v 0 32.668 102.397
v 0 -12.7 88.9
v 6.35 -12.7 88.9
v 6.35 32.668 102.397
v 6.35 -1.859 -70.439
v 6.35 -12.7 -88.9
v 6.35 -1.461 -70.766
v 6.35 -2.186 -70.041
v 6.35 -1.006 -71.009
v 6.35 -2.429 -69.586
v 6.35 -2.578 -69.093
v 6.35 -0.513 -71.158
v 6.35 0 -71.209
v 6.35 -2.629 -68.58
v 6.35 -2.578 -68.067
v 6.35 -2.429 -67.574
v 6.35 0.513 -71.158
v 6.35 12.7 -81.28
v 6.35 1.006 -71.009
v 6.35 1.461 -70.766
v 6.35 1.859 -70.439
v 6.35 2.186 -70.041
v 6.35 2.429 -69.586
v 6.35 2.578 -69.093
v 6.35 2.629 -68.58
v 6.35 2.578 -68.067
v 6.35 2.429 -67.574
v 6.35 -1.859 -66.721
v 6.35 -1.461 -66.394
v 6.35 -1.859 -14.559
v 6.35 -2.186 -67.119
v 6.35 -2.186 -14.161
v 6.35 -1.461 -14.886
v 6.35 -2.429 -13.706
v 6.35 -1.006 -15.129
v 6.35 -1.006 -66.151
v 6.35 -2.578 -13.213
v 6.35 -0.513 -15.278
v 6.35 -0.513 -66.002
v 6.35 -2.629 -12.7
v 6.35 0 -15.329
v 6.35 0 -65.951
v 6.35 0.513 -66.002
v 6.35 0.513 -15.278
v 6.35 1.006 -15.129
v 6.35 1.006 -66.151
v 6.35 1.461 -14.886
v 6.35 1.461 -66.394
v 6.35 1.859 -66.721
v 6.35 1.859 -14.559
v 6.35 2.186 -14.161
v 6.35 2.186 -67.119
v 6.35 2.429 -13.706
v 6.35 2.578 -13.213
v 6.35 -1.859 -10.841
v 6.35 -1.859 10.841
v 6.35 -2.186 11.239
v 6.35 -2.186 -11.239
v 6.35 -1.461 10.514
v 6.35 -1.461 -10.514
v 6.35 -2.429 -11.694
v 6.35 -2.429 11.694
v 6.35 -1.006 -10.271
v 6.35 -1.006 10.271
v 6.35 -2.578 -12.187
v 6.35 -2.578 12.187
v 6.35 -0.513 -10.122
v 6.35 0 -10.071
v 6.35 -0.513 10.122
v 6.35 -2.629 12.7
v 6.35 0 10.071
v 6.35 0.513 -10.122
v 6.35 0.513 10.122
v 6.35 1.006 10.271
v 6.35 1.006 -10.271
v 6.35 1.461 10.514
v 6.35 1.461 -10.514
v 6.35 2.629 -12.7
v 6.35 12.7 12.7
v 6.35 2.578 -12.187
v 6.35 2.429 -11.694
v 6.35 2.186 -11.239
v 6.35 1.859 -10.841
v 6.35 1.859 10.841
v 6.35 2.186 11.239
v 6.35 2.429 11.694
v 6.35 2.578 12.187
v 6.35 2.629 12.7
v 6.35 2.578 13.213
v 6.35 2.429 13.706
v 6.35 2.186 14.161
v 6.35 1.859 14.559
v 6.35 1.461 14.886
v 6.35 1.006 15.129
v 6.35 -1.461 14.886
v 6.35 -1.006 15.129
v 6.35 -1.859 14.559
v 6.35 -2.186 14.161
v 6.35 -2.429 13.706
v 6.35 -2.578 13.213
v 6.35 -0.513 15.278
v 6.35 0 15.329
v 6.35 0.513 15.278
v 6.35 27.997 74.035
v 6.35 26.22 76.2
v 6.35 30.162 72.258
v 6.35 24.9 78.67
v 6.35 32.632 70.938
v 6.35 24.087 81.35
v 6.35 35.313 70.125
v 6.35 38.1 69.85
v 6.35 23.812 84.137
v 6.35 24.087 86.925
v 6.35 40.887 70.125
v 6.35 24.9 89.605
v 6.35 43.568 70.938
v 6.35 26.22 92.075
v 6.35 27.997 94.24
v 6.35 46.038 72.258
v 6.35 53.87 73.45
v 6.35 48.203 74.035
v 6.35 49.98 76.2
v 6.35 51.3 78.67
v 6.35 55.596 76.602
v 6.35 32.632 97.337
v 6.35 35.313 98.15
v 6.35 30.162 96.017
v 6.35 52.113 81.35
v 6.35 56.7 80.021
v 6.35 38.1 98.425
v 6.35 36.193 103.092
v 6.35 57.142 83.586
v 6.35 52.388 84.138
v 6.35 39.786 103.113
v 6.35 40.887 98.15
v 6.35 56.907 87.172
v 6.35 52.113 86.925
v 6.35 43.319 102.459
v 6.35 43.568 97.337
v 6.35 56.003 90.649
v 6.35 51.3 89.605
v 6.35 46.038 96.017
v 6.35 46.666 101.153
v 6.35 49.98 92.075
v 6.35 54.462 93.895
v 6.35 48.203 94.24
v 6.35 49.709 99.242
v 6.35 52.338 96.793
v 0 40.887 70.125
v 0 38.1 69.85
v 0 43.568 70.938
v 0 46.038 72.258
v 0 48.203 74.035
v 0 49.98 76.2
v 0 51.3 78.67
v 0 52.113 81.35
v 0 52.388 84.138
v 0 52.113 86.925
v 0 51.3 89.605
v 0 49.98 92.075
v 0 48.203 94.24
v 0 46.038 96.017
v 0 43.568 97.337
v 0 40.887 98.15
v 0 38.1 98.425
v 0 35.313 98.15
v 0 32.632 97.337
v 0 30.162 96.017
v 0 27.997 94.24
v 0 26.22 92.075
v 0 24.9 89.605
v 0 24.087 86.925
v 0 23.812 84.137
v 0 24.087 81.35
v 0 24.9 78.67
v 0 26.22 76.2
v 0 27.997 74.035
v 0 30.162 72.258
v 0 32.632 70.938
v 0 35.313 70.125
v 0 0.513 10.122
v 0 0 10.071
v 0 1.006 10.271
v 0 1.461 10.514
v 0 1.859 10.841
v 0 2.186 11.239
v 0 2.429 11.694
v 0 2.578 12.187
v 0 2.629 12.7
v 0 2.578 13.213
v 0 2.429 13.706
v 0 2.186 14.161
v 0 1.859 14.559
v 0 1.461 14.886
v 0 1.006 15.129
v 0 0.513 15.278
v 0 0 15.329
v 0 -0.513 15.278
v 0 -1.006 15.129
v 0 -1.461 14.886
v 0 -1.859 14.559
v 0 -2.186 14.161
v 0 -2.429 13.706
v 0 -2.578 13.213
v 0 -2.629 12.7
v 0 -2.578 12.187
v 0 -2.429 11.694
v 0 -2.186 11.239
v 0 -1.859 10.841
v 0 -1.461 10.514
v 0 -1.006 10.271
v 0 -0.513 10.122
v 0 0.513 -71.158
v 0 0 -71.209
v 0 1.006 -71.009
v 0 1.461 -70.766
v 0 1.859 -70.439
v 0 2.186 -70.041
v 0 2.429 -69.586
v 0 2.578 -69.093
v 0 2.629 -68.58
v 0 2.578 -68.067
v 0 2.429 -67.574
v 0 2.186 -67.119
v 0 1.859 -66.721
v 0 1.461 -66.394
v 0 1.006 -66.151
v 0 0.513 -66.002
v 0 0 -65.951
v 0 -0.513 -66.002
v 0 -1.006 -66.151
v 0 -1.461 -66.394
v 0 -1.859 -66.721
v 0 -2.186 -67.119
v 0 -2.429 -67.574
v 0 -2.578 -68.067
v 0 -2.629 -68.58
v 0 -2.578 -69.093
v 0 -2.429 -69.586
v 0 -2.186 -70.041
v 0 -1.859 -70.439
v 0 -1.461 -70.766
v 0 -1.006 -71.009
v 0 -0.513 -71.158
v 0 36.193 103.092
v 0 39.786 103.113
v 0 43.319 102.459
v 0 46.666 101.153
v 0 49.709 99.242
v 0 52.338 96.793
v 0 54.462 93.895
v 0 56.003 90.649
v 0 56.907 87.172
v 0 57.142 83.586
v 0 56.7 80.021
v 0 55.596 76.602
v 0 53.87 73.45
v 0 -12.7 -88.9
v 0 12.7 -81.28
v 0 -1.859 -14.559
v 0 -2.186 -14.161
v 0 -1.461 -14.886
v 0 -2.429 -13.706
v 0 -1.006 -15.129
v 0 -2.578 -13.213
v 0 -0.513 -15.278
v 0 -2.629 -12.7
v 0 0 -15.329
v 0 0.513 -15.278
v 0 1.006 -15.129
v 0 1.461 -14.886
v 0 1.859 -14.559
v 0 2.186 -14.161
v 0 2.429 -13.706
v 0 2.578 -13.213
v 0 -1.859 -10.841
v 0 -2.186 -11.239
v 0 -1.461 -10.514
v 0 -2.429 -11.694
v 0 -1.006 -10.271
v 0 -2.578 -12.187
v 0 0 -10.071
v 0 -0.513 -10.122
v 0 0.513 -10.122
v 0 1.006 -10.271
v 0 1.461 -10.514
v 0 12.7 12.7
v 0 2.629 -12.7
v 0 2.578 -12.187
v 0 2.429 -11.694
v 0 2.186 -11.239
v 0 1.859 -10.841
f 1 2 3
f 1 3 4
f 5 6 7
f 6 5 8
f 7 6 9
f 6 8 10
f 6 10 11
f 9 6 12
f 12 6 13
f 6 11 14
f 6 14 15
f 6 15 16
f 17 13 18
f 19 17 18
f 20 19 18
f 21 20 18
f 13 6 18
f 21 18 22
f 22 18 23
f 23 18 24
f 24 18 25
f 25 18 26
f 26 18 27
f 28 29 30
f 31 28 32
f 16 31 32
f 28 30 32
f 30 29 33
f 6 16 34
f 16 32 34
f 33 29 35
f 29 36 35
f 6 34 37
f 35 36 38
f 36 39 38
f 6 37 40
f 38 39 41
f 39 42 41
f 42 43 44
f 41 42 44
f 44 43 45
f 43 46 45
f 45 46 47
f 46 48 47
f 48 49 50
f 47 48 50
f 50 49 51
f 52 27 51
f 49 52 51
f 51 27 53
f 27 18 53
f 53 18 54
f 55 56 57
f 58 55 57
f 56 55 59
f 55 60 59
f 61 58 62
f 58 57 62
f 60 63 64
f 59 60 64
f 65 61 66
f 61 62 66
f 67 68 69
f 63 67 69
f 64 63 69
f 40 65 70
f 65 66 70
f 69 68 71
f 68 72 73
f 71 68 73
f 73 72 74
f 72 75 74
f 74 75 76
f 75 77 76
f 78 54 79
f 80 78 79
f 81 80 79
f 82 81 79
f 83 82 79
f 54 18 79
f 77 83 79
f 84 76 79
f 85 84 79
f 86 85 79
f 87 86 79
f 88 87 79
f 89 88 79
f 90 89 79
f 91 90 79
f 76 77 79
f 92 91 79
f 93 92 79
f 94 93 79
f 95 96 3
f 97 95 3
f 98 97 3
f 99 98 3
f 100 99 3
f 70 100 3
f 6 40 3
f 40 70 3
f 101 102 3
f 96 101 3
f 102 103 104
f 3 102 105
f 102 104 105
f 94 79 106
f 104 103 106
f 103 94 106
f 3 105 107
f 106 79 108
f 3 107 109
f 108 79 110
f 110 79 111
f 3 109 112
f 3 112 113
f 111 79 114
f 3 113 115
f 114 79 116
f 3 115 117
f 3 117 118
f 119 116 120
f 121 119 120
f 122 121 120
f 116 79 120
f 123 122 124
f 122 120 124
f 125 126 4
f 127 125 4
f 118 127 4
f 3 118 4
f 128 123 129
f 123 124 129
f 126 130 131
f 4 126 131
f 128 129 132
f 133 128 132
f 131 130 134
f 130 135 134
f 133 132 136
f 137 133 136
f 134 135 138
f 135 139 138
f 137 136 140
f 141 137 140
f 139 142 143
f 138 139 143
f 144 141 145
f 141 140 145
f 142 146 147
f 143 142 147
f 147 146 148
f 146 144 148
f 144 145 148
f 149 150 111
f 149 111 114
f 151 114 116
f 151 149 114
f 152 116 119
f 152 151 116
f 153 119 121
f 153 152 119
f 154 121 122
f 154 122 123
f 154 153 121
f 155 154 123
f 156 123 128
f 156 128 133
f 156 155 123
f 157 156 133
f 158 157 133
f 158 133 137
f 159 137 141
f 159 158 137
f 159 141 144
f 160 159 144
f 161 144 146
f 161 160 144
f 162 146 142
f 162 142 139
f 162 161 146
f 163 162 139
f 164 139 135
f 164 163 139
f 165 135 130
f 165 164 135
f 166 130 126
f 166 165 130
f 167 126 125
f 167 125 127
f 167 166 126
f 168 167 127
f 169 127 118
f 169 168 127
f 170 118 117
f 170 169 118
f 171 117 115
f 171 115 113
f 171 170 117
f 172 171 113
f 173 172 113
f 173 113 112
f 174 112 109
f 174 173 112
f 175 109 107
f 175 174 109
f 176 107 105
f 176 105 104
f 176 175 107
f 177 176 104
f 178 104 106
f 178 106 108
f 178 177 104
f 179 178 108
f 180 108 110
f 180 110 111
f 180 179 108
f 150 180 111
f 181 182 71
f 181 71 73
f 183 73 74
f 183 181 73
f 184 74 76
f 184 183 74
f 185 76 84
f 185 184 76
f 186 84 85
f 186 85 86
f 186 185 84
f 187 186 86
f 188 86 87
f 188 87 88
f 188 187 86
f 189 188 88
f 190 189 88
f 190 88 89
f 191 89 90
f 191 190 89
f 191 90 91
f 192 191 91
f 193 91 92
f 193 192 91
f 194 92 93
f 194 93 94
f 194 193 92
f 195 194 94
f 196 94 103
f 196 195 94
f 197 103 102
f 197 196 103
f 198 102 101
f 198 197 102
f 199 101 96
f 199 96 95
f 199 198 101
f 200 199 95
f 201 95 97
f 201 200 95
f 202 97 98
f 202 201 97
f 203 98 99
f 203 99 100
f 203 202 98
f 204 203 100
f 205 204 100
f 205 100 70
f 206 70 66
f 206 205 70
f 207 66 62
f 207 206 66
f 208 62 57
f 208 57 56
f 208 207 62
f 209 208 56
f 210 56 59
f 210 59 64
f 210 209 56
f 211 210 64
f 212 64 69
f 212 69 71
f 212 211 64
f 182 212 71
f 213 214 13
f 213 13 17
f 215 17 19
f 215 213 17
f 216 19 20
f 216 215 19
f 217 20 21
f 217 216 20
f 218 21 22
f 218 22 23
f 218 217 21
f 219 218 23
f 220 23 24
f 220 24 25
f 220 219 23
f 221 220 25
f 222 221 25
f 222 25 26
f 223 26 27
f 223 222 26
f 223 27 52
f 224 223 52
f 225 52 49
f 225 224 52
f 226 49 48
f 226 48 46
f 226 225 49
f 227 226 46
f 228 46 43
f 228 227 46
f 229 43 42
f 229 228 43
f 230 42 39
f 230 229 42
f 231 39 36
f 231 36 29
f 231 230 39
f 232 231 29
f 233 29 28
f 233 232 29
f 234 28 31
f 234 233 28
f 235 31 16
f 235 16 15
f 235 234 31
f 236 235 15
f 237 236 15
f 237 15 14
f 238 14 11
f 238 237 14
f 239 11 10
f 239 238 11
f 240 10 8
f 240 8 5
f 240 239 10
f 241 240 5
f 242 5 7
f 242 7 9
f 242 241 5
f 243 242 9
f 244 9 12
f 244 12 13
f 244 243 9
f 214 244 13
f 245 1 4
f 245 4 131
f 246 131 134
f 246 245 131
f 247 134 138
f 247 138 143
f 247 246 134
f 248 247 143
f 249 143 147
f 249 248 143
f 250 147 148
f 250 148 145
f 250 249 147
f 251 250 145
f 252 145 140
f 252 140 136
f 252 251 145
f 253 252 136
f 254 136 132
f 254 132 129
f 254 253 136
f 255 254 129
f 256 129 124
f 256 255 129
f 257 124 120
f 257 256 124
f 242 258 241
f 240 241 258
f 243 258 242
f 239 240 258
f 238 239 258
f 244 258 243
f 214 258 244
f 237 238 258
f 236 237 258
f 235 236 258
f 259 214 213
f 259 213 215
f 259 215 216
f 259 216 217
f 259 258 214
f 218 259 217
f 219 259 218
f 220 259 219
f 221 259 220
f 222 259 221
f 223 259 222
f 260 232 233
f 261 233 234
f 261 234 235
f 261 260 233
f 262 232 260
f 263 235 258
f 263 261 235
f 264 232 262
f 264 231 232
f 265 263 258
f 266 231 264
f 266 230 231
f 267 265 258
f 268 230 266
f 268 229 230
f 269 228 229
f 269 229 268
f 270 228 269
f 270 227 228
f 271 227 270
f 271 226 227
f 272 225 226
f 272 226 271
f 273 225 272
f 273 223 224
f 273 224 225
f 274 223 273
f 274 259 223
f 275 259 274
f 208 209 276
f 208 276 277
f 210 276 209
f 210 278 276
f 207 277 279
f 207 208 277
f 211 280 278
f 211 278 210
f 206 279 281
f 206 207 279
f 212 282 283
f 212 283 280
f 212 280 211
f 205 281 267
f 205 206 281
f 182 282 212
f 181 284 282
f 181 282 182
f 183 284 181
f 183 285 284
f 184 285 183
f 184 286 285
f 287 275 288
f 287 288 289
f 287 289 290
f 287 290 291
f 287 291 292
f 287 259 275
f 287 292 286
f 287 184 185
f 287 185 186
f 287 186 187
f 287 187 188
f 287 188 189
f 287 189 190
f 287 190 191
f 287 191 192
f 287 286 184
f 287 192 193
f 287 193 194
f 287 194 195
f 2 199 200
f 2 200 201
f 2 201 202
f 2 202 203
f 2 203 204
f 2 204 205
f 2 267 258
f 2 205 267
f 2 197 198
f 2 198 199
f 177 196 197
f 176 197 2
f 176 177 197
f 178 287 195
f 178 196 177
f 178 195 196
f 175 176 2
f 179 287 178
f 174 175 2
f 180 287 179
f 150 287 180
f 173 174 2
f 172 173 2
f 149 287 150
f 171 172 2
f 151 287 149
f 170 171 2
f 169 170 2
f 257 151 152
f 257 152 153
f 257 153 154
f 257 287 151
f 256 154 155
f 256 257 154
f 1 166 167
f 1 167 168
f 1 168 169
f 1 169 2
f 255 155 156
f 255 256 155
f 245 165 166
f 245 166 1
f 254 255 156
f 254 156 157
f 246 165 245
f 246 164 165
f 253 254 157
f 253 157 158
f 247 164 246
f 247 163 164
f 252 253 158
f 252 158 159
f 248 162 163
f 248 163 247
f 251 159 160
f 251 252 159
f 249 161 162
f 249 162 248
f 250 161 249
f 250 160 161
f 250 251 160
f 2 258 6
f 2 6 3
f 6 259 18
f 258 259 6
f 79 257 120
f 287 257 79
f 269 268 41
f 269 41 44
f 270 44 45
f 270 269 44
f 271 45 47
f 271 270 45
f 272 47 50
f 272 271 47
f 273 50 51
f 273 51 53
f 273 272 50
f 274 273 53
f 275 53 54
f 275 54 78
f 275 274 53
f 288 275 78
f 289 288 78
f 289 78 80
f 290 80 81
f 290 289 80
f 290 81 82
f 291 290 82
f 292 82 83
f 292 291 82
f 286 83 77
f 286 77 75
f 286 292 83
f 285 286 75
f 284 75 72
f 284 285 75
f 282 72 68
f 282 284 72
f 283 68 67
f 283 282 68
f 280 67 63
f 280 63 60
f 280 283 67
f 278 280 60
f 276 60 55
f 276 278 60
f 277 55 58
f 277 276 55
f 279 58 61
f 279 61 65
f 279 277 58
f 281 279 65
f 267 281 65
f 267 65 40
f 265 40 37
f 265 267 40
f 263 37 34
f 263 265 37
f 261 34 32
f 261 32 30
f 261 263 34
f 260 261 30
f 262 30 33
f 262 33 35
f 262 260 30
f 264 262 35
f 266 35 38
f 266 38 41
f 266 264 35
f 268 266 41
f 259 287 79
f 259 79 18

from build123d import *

# Parameters (mm, degrees)
SKETCH1_R           = 14.2875
SKETCH1_R_2         = 2.6289
BOSS_EXTRUDE1_DEPTH = 6.35


with BuildPart() as part:
    # Sketch1 → Boss-Extrude1 (new body)
    with BuildSketch(Plane(origin=(0, 0, 0), x_dir=(0, 0, -1), z_dir=(1, 0, 0))):
        with BuildLine():
            Line((-12.7, -12.7), (-88.9, -12.7))
            Line((-88.9, -12.7), (-102.396644635, 32.66804481))
            ThreePointArc((-102.396644635, 32.66804481), (-95.394210317, 53.468440807), (-73.450431984, 53.869878795))
            Line((-73.450431984, 53.869878795), (-12.7, 12.7))
            Line((-12.7, 12.7), (25.4, 12.7))
            Line((25.4, 12.7), (81.28, 12.7))
            Line((81.28, 12.7), (88.9, -12.7))
            Line((88.9, -12.7), (25.4, -12.7))
            Line((25.4, -12.7), (-12.7, -12.7))
        make_face()
        with Locations((-84.1375, 38.1)):
            Circle(SKETCH1_R, mode=Mode.SUBTRACT)
        with Locations((-12.7, 0)):
            Circle(SKETCH1_R_2, mode=Mode.SUBTRACT)
        with Locations((12.7, 0)):
            Circle(SKETCH1_R_2, mode=Mode.SUBTRACT)
        with Locations((68.58, 0)):
            Circle(SKETCH1_R_2, mode=Mode.SUBTRACT)
    extrude(amount=BOSS_EXTRUDE1_DEPTH)


solid = part.part
